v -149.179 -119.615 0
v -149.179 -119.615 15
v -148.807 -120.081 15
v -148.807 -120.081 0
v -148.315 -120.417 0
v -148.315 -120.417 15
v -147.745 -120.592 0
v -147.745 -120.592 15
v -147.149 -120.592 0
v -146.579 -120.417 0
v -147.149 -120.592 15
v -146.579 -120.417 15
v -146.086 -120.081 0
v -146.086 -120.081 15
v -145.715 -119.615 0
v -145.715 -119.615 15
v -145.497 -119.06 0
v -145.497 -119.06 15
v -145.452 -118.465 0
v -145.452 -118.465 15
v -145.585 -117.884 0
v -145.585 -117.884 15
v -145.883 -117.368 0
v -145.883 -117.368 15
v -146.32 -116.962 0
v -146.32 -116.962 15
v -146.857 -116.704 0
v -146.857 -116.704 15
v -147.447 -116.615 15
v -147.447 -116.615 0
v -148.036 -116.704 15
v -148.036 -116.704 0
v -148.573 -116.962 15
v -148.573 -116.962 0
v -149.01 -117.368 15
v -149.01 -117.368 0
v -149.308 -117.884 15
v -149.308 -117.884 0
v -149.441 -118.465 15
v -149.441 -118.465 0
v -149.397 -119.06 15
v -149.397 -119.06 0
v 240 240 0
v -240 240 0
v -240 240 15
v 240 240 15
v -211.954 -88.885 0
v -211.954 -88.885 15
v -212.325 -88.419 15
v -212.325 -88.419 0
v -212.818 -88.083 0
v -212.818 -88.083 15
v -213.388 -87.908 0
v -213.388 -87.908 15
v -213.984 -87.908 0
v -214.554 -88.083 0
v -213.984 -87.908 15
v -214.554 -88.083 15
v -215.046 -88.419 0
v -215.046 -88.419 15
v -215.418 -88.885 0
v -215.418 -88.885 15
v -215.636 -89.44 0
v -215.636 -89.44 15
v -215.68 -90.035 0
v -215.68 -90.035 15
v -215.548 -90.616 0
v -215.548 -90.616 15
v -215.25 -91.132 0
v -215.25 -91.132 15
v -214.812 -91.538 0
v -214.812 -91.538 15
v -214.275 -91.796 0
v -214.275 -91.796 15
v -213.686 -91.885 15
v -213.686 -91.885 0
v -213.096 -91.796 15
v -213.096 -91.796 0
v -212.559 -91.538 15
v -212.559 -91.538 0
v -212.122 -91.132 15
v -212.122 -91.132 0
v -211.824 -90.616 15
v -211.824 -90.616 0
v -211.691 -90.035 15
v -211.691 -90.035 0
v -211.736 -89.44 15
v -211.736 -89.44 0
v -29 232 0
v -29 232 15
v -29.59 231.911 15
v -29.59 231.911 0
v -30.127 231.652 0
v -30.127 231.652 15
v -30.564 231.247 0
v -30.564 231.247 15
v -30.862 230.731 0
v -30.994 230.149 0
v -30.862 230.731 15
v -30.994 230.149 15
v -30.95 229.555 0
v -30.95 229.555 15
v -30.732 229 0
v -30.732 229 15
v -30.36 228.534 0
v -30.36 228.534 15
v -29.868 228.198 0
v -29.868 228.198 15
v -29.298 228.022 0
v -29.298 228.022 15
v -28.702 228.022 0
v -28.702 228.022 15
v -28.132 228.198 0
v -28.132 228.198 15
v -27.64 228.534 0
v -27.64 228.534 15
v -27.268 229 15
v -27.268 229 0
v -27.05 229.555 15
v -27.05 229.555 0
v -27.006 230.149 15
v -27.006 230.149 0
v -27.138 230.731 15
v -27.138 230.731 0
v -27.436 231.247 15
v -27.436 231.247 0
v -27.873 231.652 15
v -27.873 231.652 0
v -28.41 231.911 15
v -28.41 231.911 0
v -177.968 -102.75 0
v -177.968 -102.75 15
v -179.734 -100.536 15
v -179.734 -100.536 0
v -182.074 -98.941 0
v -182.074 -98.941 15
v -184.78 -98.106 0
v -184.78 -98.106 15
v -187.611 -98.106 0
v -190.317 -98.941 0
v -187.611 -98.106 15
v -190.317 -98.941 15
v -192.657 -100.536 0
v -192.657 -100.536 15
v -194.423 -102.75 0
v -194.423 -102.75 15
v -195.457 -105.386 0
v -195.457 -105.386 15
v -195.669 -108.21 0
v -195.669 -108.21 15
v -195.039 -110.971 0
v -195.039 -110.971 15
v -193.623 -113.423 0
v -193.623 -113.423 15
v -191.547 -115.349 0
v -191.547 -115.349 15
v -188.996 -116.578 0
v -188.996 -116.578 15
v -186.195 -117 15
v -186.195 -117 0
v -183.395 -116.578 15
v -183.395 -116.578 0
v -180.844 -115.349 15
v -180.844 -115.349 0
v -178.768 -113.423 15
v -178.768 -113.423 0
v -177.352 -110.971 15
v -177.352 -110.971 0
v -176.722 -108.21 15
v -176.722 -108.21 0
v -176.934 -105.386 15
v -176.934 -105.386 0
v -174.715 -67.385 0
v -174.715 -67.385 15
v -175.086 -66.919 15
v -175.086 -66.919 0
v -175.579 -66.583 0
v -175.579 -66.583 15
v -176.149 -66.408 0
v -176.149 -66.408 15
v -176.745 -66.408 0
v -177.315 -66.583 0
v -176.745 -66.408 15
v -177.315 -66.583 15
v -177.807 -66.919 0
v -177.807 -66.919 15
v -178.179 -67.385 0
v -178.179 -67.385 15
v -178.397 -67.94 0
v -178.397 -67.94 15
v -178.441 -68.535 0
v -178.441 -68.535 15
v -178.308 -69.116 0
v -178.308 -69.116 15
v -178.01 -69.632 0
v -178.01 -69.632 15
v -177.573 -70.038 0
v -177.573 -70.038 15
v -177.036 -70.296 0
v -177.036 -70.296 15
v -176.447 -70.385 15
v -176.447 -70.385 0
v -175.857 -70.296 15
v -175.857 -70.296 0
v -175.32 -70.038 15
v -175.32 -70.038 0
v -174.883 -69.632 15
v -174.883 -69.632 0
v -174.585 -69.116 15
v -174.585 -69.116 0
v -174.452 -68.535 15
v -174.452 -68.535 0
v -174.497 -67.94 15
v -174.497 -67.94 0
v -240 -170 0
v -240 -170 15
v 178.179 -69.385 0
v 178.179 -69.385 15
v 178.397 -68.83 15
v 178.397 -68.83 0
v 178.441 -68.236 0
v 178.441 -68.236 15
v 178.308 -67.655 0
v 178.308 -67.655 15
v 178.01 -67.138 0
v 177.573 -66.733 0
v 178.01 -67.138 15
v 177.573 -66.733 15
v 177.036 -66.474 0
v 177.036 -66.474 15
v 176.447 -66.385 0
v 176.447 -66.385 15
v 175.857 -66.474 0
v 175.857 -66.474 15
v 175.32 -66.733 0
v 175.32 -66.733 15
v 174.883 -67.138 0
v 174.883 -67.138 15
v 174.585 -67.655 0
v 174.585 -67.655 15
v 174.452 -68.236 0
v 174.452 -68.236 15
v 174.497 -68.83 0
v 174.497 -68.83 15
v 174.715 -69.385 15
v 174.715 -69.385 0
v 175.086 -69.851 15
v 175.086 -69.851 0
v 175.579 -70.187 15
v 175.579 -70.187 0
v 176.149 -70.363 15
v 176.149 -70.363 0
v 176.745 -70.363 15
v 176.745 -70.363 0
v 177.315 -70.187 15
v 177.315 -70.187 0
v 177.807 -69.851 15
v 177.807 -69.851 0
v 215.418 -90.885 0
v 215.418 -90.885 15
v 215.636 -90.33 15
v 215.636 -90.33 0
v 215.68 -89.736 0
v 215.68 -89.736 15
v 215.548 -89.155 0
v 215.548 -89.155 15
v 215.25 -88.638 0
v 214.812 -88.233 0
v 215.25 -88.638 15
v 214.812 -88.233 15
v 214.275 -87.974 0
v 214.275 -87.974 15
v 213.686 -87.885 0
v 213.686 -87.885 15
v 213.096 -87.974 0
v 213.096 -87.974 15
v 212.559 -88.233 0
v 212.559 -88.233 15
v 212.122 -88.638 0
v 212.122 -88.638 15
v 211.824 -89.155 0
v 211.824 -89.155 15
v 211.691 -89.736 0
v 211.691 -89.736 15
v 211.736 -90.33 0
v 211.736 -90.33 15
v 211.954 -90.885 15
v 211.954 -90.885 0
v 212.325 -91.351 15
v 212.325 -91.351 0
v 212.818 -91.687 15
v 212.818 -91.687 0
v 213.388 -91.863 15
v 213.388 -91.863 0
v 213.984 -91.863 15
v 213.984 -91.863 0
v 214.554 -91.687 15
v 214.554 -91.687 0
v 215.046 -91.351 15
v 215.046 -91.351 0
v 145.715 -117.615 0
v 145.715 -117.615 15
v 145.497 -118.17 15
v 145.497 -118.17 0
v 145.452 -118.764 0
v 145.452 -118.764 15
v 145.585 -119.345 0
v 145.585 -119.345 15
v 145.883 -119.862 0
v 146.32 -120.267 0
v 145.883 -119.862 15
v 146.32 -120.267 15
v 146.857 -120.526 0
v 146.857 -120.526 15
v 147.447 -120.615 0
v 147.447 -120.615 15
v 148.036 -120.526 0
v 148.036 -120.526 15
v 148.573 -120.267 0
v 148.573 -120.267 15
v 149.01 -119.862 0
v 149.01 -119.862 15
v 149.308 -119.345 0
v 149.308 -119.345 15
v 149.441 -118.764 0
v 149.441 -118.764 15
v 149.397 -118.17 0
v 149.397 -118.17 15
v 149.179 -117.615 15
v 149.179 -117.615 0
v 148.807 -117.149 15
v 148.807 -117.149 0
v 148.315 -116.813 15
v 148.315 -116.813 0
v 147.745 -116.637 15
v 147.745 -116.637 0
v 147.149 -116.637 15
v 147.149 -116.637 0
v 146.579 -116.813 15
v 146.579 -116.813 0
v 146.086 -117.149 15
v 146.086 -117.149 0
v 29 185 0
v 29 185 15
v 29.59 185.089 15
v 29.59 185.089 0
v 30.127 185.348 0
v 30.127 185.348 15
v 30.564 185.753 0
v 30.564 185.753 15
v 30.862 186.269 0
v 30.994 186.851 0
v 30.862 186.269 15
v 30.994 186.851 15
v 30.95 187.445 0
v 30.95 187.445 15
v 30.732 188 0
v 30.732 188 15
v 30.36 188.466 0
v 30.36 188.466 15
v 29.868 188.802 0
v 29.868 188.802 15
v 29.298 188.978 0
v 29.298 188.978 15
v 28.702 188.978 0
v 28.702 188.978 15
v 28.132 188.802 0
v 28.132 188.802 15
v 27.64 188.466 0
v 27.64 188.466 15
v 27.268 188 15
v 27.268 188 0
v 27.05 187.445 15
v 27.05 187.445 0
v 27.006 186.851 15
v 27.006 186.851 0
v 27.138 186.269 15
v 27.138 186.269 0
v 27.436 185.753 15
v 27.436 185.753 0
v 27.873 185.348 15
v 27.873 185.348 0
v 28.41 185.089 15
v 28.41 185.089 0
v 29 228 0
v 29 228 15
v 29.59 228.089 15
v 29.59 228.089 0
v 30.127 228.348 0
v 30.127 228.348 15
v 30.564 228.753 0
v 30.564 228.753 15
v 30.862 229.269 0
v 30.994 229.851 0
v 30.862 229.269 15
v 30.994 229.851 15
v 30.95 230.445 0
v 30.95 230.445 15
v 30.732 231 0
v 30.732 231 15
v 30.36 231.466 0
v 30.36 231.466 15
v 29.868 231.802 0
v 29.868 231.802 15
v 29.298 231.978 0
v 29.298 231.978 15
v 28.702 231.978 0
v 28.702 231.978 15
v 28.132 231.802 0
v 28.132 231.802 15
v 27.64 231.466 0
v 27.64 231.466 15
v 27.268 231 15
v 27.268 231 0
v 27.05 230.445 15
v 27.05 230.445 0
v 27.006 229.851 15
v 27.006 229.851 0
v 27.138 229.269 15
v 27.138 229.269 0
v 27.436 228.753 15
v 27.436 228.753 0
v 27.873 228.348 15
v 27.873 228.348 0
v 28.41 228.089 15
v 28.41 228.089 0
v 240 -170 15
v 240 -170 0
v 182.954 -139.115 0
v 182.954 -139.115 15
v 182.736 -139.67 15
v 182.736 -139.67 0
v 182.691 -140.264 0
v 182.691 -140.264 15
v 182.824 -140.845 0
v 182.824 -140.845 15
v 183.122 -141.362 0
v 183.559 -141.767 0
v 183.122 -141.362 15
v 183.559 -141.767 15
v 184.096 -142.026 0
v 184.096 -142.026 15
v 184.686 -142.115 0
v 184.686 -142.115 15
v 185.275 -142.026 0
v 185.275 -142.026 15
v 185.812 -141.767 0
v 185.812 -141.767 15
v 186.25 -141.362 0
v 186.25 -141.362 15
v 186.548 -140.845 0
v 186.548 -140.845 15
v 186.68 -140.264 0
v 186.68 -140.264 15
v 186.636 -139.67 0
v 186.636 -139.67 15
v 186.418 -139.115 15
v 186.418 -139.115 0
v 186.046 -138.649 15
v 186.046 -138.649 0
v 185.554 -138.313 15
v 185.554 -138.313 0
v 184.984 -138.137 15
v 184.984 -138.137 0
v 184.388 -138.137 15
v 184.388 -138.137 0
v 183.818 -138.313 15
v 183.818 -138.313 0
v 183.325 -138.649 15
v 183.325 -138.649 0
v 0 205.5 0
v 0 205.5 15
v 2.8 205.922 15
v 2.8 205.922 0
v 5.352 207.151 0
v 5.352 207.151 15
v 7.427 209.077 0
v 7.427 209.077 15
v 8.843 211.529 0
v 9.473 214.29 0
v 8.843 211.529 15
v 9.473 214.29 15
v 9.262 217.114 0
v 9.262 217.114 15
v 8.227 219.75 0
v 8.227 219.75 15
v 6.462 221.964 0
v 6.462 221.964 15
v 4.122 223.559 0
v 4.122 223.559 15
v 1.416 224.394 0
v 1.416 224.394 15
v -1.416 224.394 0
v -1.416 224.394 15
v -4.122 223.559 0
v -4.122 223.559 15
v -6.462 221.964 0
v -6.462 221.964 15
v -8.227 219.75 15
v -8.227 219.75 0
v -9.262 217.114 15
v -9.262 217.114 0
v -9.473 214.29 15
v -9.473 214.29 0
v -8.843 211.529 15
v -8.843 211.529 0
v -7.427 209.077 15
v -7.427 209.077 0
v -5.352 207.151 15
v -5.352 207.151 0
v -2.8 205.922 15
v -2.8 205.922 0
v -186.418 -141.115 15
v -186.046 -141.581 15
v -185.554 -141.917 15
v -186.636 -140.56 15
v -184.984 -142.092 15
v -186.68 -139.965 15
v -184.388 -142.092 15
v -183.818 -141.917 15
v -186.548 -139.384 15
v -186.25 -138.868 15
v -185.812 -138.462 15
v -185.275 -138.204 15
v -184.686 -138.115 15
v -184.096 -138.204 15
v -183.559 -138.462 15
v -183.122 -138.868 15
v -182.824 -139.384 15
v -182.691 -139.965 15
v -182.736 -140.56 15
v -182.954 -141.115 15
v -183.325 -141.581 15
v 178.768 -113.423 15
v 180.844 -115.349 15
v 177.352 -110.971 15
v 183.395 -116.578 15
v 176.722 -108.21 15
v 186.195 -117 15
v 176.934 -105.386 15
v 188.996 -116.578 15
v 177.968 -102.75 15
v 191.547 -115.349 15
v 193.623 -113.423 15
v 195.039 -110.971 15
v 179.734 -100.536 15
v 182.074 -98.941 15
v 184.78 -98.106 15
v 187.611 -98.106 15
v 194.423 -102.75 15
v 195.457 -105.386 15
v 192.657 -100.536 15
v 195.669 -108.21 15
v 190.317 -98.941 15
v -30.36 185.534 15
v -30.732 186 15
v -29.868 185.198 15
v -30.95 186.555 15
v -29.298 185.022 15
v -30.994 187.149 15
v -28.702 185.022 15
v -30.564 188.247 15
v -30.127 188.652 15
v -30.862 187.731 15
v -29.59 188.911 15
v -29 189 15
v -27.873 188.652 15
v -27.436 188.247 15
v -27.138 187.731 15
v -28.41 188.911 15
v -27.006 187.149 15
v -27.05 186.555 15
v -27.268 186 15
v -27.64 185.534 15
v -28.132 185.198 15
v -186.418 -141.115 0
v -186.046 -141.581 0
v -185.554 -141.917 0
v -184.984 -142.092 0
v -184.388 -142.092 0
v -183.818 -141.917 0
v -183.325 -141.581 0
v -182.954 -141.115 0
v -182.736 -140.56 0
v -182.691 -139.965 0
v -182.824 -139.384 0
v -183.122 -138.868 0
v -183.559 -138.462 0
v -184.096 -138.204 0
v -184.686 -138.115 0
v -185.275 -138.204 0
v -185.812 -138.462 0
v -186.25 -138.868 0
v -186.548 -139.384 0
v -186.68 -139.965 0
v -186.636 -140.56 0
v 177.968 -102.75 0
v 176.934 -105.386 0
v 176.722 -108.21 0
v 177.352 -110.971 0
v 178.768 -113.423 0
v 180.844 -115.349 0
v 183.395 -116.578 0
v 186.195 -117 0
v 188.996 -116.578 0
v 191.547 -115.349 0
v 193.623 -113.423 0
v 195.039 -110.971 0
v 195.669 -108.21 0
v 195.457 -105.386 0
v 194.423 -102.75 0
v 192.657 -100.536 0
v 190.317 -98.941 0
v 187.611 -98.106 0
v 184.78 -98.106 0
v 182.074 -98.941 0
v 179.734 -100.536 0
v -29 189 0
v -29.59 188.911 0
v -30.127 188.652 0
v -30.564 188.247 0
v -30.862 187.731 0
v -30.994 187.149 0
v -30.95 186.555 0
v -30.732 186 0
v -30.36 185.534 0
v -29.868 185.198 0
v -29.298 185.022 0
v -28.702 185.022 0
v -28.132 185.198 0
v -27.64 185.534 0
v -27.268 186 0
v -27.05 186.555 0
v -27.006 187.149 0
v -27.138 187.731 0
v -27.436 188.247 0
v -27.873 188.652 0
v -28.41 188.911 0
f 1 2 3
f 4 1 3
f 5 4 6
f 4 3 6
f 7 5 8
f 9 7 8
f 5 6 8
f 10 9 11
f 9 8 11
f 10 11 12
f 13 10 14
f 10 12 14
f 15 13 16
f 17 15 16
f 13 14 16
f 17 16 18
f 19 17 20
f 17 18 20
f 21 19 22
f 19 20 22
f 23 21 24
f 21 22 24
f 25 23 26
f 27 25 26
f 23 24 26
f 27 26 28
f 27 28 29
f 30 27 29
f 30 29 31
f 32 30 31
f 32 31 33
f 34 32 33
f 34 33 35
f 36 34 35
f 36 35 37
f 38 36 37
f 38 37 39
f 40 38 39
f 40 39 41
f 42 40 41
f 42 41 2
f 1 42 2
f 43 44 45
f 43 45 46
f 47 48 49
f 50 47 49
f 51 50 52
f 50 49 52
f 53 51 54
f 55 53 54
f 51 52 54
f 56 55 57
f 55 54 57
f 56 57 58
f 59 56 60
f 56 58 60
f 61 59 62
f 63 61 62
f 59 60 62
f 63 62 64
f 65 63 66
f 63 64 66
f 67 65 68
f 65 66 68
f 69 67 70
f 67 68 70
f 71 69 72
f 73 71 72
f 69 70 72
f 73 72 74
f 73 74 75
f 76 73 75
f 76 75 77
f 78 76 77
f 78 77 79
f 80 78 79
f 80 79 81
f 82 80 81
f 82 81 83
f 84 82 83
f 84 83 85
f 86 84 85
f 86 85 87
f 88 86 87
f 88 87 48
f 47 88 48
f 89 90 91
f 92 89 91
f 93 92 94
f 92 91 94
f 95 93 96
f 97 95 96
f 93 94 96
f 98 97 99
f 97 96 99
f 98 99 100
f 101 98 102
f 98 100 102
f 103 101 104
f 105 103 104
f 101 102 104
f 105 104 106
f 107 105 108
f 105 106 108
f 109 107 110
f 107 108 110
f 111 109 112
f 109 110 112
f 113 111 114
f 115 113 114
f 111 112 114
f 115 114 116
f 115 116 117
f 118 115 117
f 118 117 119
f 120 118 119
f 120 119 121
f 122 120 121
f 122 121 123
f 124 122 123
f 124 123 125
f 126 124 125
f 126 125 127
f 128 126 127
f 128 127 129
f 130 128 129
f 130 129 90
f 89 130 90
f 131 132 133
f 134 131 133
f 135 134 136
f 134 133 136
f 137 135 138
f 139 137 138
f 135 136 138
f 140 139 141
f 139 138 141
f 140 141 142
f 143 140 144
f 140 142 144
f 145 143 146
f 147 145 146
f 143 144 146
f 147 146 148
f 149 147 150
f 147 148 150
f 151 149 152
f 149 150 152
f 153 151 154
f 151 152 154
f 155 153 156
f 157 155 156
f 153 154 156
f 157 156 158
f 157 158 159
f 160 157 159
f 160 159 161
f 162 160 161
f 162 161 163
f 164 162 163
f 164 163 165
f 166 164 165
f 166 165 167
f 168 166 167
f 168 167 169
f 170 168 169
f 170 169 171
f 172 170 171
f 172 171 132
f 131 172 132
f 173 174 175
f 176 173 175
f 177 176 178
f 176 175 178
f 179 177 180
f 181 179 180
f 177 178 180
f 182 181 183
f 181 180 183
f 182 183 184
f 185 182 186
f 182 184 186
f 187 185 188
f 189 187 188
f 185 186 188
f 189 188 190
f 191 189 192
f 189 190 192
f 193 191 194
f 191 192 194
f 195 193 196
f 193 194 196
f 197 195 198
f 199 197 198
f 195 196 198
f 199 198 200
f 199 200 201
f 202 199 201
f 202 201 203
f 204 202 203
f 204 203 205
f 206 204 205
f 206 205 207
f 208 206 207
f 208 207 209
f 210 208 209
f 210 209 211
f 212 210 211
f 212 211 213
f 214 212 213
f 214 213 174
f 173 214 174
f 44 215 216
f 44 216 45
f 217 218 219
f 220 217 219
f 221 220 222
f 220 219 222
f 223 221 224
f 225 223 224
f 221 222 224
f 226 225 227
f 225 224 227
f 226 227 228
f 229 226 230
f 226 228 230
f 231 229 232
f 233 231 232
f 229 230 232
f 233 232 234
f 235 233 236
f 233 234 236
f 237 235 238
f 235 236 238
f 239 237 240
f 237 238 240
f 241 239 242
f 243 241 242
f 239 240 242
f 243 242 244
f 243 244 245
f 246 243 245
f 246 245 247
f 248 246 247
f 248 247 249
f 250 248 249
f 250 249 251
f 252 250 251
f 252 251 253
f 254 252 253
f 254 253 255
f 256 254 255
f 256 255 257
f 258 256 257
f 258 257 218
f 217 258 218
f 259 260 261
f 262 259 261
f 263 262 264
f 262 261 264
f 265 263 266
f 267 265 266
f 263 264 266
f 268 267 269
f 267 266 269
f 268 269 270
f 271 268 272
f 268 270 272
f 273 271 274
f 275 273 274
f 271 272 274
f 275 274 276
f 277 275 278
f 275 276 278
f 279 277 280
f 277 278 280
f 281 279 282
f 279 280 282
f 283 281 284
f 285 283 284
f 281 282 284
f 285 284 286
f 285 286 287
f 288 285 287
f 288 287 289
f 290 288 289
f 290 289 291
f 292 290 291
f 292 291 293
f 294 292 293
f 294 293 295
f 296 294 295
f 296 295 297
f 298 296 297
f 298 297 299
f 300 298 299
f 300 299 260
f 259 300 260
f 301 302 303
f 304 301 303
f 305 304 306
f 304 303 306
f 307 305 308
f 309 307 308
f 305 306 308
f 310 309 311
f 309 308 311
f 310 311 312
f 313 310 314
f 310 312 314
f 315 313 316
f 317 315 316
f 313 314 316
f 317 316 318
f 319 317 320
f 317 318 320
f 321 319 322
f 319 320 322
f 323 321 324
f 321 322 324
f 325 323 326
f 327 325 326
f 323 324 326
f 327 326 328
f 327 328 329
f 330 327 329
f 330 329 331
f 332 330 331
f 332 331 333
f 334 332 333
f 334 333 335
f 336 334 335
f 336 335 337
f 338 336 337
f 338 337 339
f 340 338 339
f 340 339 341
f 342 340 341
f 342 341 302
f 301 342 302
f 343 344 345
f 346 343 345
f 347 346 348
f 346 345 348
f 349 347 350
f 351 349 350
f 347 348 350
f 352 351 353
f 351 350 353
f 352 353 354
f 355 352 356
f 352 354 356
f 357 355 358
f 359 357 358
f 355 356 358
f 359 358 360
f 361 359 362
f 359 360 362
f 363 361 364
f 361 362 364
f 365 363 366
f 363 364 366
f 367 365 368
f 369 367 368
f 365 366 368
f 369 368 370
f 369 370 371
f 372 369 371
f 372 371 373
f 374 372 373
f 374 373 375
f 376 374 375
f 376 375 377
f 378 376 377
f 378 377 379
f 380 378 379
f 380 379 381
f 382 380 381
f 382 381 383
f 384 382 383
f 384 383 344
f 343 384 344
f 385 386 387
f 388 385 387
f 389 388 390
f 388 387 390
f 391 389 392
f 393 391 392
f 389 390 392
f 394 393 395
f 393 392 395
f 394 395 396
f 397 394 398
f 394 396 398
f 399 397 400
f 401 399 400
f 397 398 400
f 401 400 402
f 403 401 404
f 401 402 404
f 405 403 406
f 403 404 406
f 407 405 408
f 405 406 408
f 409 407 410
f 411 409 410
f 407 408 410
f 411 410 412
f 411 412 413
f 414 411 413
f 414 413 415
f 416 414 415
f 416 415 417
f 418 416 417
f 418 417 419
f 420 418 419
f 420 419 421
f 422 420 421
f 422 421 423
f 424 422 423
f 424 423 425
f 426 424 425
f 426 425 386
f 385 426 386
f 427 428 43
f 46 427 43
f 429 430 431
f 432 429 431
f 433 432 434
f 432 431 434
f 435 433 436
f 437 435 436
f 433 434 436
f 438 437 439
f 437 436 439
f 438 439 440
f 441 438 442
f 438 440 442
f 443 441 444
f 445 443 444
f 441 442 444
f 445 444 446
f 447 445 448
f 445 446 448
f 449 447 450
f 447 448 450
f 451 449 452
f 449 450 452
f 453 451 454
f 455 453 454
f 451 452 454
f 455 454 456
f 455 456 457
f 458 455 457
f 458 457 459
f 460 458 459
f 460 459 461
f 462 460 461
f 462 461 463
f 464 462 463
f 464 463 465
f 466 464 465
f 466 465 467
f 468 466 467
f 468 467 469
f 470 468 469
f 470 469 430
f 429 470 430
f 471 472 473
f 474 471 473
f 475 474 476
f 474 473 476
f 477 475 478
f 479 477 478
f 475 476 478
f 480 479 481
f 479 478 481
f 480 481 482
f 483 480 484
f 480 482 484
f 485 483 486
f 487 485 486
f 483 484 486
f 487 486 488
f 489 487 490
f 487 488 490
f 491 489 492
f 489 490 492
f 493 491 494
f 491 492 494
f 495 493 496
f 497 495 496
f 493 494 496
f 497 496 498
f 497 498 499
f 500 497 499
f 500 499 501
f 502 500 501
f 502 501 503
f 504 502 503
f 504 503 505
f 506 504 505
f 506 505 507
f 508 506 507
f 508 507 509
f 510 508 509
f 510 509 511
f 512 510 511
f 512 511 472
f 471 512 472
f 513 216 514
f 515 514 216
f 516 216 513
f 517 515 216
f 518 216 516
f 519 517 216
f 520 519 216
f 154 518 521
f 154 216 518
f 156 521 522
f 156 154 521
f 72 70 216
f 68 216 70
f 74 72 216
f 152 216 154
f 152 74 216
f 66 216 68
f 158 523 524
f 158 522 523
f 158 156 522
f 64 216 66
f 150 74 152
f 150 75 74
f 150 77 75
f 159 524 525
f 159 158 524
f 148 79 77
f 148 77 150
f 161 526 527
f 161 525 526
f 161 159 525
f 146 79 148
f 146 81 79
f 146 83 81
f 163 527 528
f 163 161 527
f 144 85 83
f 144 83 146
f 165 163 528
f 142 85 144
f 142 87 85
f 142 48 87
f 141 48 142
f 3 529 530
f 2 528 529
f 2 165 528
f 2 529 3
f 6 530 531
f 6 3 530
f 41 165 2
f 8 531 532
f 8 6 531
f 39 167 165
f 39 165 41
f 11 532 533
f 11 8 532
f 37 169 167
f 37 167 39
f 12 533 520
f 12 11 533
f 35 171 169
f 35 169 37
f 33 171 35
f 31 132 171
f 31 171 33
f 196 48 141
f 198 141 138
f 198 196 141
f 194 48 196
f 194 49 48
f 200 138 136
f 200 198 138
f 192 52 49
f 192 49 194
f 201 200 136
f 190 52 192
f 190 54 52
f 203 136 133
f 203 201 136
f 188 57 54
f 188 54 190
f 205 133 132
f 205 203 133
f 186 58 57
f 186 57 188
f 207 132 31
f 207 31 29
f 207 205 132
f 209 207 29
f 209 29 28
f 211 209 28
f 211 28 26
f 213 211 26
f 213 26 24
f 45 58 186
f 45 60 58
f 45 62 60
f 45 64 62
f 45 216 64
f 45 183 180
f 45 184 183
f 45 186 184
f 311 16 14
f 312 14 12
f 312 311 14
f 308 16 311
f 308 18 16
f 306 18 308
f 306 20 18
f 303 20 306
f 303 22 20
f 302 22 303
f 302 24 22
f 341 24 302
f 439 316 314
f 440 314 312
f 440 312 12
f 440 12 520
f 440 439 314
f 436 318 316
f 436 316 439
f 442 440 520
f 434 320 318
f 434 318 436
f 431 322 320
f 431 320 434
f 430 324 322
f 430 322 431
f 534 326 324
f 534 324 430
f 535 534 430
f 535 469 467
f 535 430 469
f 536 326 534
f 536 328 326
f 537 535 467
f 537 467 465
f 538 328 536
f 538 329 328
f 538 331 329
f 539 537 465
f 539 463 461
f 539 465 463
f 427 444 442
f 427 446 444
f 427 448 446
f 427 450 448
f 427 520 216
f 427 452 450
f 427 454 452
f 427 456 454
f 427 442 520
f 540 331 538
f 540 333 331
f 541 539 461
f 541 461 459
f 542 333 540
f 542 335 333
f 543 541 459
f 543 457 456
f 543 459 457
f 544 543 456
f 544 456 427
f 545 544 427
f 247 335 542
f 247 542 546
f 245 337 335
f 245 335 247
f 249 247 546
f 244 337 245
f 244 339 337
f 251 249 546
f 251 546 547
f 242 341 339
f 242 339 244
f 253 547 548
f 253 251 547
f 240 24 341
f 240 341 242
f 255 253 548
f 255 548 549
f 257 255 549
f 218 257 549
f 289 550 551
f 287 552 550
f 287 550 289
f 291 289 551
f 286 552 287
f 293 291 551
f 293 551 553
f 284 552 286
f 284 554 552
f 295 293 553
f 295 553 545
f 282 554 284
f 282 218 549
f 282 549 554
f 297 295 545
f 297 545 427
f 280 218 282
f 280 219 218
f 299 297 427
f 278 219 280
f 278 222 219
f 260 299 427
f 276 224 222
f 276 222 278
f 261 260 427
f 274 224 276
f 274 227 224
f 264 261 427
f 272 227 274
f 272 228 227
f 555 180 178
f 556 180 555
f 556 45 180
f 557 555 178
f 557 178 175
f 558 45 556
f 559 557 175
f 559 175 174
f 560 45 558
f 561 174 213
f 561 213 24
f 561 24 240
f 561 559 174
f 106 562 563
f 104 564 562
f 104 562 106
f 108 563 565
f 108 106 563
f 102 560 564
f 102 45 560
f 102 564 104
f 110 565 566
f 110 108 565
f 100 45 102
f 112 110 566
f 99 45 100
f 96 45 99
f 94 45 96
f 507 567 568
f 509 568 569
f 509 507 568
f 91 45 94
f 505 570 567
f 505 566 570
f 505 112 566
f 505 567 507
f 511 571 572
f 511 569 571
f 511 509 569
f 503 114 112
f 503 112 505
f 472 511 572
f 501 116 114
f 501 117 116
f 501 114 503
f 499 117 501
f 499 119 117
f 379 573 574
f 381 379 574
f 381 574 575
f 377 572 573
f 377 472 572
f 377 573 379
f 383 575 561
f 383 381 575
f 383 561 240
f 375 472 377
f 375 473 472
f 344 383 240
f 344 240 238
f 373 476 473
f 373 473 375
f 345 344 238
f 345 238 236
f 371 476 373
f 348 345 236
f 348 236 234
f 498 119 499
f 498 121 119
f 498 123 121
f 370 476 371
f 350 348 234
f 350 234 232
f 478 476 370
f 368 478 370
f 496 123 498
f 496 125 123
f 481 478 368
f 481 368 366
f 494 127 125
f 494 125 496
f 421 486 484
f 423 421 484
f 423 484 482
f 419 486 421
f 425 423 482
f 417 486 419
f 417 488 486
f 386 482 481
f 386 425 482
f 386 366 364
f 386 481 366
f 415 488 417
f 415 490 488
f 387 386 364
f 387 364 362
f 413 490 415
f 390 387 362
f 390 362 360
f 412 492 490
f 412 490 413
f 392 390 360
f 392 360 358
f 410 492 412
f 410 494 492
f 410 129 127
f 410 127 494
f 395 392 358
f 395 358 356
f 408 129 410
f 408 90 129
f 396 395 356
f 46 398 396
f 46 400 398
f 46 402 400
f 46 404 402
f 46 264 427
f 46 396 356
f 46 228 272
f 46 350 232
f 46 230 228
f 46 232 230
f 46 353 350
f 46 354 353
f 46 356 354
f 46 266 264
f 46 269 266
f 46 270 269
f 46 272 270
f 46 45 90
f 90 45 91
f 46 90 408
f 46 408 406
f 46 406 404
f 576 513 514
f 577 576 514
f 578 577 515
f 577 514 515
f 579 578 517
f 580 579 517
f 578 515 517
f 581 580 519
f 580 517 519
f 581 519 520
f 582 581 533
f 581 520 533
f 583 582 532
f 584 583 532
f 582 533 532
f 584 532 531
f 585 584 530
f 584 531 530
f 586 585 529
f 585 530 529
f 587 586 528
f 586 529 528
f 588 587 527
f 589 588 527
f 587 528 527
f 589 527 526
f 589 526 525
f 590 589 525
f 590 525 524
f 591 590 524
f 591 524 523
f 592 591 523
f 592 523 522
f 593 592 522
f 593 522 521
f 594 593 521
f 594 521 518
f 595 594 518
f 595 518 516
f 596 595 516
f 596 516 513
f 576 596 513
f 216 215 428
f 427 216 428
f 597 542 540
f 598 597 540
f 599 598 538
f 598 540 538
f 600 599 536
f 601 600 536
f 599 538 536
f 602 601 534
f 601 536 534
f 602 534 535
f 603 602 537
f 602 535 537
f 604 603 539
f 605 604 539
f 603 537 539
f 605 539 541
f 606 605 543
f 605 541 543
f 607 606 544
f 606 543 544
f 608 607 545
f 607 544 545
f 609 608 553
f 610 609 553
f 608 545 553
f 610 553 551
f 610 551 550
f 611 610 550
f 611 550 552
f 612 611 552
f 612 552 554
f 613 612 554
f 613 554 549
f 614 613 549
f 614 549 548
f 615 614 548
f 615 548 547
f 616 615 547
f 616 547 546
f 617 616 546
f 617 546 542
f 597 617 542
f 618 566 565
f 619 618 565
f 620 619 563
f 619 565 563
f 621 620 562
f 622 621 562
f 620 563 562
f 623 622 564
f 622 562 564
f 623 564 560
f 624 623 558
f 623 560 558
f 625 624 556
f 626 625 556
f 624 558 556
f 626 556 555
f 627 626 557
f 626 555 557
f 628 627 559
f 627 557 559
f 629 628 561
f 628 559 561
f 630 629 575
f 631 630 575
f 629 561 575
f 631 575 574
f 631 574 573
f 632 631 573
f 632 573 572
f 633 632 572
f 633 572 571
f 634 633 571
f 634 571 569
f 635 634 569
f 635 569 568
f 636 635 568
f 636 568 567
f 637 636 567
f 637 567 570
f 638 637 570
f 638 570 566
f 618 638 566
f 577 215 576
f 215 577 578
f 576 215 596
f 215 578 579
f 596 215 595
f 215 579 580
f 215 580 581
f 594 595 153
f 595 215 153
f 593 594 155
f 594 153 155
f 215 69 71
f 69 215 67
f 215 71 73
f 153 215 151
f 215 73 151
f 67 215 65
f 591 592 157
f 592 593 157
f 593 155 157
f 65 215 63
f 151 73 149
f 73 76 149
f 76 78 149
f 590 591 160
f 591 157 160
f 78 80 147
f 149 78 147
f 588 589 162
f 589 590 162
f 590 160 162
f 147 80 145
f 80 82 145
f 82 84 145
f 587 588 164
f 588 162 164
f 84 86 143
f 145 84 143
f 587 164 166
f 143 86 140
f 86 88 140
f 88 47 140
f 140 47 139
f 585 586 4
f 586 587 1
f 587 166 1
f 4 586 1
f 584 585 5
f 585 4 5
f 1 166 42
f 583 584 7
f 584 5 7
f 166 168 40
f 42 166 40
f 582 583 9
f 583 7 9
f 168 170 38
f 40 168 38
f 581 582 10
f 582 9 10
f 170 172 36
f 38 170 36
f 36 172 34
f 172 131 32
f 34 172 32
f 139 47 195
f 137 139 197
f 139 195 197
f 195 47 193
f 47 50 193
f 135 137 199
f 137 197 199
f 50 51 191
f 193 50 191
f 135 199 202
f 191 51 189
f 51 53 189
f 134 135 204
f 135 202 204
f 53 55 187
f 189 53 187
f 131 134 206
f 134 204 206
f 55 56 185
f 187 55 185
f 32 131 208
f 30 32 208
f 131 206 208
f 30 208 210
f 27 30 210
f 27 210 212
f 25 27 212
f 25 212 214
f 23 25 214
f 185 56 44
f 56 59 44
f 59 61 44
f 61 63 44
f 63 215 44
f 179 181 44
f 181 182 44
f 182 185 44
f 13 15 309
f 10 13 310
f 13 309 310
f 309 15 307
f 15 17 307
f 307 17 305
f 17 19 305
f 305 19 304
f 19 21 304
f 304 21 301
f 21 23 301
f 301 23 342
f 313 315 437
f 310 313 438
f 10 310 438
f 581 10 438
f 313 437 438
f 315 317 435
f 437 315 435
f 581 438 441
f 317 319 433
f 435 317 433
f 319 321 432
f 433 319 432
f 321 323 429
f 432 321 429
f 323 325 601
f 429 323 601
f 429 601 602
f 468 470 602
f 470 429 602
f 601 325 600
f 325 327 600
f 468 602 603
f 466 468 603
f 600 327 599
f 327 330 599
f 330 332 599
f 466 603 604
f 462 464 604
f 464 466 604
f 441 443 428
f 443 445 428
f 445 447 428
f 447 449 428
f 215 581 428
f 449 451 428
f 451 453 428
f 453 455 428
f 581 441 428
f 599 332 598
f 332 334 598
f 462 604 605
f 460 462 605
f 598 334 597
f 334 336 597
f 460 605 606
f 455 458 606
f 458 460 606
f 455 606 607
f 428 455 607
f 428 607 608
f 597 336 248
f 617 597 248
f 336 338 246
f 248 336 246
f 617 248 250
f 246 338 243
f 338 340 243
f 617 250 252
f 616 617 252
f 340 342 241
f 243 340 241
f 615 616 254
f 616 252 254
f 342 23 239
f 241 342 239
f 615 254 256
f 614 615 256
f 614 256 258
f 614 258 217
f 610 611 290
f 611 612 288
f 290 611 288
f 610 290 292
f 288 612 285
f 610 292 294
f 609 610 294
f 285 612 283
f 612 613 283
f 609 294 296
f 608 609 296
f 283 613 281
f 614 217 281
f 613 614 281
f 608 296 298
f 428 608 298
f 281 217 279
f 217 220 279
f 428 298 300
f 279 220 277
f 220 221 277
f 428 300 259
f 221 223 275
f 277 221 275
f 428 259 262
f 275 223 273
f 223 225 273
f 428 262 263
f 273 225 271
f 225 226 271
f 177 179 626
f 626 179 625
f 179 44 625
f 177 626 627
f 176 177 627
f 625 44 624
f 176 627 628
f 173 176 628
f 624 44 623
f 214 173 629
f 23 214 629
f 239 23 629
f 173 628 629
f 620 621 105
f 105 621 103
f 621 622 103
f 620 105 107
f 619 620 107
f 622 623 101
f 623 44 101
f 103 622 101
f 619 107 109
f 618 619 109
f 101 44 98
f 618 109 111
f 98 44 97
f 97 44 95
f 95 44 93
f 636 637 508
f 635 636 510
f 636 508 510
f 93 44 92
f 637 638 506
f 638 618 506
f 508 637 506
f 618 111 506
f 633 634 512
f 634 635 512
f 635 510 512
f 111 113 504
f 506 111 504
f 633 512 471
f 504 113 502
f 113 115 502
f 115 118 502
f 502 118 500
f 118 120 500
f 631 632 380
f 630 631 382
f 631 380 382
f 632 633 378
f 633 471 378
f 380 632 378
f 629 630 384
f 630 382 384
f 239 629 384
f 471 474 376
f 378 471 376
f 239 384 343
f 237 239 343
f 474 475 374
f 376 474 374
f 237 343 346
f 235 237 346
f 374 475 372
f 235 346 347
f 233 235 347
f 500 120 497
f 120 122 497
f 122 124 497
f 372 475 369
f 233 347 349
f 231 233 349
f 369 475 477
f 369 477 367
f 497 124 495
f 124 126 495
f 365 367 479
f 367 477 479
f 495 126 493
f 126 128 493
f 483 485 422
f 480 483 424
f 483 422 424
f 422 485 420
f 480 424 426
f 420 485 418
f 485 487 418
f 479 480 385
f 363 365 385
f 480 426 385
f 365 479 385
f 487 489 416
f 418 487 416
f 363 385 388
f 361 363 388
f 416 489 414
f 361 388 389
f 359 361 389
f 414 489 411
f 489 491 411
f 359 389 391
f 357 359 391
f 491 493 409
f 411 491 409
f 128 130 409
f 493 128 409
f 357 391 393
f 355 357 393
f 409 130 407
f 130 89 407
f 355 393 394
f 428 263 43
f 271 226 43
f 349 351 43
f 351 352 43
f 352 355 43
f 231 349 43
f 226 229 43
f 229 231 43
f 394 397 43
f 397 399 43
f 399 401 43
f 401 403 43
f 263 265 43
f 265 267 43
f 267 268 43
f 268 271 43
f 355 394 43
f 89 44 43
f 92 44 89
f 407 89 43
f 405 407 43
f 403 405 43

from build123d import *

# Parameters (mm, degrees)
SKETCH1_W           = 480
SKETCH1_H           = 410
BOSS_EXTRUDE1_DEPTH = 15
SKETCH6_R           = 2
SKETCH6_R_2         = 9.5
CUT_EXTRUDE1_DEPTH  = 340.742549587
CIRPATTERN1_COUNT   = 3
CIRPATTERN1_ANGLE   = 180
CIRPATTERN2_COUNT   = 6
CIRPATTERN2_ANGLE   = 150
SKETCH8_W           = 471.000952056
SKETCH8_H           = 87.60062656
BOSS_EXTRUDE2_DEPTH = 15


with BuildPart() as part:
    # Sketch1 → Boss-Extrude1 (new body)
    with BuildSketch(Plane.XY):
        with Locations((0, 35)):
            Rectangle(SKETCH1_W, SKETCH1_H)
    extrude(amount=BOSS_EXTRUDE1_DEPTH)

    # Sketch6 → Cut-Extrude1 (cut, through all)
    with BuildSketch(Plane.XY.offset(15)):
        with Locations((-230, 29)):
            Circle(SKETCH6_R)
        with Locations((-187, 29)):
            Circle(SKETCH6_R)
        with Locations(Location((-230, -29, 0), (0, 0, 180))):
            Circle(SKETCH6_R)
        with Locations(Location((-187, -29, 0), (0, 0, 180))):
            Circle(SKETCH6_R)
        with Locations((-215, 0)):
            Circle(SKETCH6_R_2)
    cut_extrude1 = extrude(amount=-CUT_EXTRUDE1_DEPTH, mode=Mode.SUBTRACT)

    # CirPattern1: Cut-Extrude1 ×3 about axis
    cirpattern1_axis = Axis((0, 0, 0), (0, 0, -1))
    for i in range(1, CIRPATTERN1_COUNT):
        add(cut_extrude1.rotate(cirpattern1_axis, i * CIRPATTERN1_ANGLE / (CIRPATTERN1_COUNT - 1)), mode=Mode.SUBTRACT)

    # CirPattern2: Cut-Extrude1 ×6 about axis, 3 skipped
    cirpattern2_axis = Axis((0, 0, 0), (0, 0, 1))
    add([cut_extrude1.rotate(cirpattern2_axis, i * CIRPATTERN2_ANGLE / (CIRPATTERN2_COUNT - 1)) for i in range(1, CIRPATTERN2_COUNT) if i not in (2, 3, 4)], mode=Mode.SUBTRACT)

    # Sketch8 → Boss-Extrude2 (add)
    with BuildSketch(Plane(origin=(0, 0, 0), x_dir=(-1, 0, 0), z_dir=(0, 0, -1))):
        Rectangle(SKETCH8_W, SKETCH8_H)
    extrude(amount=-BOSS_EXTRUDE2_DEPTH)


solid = part.part
